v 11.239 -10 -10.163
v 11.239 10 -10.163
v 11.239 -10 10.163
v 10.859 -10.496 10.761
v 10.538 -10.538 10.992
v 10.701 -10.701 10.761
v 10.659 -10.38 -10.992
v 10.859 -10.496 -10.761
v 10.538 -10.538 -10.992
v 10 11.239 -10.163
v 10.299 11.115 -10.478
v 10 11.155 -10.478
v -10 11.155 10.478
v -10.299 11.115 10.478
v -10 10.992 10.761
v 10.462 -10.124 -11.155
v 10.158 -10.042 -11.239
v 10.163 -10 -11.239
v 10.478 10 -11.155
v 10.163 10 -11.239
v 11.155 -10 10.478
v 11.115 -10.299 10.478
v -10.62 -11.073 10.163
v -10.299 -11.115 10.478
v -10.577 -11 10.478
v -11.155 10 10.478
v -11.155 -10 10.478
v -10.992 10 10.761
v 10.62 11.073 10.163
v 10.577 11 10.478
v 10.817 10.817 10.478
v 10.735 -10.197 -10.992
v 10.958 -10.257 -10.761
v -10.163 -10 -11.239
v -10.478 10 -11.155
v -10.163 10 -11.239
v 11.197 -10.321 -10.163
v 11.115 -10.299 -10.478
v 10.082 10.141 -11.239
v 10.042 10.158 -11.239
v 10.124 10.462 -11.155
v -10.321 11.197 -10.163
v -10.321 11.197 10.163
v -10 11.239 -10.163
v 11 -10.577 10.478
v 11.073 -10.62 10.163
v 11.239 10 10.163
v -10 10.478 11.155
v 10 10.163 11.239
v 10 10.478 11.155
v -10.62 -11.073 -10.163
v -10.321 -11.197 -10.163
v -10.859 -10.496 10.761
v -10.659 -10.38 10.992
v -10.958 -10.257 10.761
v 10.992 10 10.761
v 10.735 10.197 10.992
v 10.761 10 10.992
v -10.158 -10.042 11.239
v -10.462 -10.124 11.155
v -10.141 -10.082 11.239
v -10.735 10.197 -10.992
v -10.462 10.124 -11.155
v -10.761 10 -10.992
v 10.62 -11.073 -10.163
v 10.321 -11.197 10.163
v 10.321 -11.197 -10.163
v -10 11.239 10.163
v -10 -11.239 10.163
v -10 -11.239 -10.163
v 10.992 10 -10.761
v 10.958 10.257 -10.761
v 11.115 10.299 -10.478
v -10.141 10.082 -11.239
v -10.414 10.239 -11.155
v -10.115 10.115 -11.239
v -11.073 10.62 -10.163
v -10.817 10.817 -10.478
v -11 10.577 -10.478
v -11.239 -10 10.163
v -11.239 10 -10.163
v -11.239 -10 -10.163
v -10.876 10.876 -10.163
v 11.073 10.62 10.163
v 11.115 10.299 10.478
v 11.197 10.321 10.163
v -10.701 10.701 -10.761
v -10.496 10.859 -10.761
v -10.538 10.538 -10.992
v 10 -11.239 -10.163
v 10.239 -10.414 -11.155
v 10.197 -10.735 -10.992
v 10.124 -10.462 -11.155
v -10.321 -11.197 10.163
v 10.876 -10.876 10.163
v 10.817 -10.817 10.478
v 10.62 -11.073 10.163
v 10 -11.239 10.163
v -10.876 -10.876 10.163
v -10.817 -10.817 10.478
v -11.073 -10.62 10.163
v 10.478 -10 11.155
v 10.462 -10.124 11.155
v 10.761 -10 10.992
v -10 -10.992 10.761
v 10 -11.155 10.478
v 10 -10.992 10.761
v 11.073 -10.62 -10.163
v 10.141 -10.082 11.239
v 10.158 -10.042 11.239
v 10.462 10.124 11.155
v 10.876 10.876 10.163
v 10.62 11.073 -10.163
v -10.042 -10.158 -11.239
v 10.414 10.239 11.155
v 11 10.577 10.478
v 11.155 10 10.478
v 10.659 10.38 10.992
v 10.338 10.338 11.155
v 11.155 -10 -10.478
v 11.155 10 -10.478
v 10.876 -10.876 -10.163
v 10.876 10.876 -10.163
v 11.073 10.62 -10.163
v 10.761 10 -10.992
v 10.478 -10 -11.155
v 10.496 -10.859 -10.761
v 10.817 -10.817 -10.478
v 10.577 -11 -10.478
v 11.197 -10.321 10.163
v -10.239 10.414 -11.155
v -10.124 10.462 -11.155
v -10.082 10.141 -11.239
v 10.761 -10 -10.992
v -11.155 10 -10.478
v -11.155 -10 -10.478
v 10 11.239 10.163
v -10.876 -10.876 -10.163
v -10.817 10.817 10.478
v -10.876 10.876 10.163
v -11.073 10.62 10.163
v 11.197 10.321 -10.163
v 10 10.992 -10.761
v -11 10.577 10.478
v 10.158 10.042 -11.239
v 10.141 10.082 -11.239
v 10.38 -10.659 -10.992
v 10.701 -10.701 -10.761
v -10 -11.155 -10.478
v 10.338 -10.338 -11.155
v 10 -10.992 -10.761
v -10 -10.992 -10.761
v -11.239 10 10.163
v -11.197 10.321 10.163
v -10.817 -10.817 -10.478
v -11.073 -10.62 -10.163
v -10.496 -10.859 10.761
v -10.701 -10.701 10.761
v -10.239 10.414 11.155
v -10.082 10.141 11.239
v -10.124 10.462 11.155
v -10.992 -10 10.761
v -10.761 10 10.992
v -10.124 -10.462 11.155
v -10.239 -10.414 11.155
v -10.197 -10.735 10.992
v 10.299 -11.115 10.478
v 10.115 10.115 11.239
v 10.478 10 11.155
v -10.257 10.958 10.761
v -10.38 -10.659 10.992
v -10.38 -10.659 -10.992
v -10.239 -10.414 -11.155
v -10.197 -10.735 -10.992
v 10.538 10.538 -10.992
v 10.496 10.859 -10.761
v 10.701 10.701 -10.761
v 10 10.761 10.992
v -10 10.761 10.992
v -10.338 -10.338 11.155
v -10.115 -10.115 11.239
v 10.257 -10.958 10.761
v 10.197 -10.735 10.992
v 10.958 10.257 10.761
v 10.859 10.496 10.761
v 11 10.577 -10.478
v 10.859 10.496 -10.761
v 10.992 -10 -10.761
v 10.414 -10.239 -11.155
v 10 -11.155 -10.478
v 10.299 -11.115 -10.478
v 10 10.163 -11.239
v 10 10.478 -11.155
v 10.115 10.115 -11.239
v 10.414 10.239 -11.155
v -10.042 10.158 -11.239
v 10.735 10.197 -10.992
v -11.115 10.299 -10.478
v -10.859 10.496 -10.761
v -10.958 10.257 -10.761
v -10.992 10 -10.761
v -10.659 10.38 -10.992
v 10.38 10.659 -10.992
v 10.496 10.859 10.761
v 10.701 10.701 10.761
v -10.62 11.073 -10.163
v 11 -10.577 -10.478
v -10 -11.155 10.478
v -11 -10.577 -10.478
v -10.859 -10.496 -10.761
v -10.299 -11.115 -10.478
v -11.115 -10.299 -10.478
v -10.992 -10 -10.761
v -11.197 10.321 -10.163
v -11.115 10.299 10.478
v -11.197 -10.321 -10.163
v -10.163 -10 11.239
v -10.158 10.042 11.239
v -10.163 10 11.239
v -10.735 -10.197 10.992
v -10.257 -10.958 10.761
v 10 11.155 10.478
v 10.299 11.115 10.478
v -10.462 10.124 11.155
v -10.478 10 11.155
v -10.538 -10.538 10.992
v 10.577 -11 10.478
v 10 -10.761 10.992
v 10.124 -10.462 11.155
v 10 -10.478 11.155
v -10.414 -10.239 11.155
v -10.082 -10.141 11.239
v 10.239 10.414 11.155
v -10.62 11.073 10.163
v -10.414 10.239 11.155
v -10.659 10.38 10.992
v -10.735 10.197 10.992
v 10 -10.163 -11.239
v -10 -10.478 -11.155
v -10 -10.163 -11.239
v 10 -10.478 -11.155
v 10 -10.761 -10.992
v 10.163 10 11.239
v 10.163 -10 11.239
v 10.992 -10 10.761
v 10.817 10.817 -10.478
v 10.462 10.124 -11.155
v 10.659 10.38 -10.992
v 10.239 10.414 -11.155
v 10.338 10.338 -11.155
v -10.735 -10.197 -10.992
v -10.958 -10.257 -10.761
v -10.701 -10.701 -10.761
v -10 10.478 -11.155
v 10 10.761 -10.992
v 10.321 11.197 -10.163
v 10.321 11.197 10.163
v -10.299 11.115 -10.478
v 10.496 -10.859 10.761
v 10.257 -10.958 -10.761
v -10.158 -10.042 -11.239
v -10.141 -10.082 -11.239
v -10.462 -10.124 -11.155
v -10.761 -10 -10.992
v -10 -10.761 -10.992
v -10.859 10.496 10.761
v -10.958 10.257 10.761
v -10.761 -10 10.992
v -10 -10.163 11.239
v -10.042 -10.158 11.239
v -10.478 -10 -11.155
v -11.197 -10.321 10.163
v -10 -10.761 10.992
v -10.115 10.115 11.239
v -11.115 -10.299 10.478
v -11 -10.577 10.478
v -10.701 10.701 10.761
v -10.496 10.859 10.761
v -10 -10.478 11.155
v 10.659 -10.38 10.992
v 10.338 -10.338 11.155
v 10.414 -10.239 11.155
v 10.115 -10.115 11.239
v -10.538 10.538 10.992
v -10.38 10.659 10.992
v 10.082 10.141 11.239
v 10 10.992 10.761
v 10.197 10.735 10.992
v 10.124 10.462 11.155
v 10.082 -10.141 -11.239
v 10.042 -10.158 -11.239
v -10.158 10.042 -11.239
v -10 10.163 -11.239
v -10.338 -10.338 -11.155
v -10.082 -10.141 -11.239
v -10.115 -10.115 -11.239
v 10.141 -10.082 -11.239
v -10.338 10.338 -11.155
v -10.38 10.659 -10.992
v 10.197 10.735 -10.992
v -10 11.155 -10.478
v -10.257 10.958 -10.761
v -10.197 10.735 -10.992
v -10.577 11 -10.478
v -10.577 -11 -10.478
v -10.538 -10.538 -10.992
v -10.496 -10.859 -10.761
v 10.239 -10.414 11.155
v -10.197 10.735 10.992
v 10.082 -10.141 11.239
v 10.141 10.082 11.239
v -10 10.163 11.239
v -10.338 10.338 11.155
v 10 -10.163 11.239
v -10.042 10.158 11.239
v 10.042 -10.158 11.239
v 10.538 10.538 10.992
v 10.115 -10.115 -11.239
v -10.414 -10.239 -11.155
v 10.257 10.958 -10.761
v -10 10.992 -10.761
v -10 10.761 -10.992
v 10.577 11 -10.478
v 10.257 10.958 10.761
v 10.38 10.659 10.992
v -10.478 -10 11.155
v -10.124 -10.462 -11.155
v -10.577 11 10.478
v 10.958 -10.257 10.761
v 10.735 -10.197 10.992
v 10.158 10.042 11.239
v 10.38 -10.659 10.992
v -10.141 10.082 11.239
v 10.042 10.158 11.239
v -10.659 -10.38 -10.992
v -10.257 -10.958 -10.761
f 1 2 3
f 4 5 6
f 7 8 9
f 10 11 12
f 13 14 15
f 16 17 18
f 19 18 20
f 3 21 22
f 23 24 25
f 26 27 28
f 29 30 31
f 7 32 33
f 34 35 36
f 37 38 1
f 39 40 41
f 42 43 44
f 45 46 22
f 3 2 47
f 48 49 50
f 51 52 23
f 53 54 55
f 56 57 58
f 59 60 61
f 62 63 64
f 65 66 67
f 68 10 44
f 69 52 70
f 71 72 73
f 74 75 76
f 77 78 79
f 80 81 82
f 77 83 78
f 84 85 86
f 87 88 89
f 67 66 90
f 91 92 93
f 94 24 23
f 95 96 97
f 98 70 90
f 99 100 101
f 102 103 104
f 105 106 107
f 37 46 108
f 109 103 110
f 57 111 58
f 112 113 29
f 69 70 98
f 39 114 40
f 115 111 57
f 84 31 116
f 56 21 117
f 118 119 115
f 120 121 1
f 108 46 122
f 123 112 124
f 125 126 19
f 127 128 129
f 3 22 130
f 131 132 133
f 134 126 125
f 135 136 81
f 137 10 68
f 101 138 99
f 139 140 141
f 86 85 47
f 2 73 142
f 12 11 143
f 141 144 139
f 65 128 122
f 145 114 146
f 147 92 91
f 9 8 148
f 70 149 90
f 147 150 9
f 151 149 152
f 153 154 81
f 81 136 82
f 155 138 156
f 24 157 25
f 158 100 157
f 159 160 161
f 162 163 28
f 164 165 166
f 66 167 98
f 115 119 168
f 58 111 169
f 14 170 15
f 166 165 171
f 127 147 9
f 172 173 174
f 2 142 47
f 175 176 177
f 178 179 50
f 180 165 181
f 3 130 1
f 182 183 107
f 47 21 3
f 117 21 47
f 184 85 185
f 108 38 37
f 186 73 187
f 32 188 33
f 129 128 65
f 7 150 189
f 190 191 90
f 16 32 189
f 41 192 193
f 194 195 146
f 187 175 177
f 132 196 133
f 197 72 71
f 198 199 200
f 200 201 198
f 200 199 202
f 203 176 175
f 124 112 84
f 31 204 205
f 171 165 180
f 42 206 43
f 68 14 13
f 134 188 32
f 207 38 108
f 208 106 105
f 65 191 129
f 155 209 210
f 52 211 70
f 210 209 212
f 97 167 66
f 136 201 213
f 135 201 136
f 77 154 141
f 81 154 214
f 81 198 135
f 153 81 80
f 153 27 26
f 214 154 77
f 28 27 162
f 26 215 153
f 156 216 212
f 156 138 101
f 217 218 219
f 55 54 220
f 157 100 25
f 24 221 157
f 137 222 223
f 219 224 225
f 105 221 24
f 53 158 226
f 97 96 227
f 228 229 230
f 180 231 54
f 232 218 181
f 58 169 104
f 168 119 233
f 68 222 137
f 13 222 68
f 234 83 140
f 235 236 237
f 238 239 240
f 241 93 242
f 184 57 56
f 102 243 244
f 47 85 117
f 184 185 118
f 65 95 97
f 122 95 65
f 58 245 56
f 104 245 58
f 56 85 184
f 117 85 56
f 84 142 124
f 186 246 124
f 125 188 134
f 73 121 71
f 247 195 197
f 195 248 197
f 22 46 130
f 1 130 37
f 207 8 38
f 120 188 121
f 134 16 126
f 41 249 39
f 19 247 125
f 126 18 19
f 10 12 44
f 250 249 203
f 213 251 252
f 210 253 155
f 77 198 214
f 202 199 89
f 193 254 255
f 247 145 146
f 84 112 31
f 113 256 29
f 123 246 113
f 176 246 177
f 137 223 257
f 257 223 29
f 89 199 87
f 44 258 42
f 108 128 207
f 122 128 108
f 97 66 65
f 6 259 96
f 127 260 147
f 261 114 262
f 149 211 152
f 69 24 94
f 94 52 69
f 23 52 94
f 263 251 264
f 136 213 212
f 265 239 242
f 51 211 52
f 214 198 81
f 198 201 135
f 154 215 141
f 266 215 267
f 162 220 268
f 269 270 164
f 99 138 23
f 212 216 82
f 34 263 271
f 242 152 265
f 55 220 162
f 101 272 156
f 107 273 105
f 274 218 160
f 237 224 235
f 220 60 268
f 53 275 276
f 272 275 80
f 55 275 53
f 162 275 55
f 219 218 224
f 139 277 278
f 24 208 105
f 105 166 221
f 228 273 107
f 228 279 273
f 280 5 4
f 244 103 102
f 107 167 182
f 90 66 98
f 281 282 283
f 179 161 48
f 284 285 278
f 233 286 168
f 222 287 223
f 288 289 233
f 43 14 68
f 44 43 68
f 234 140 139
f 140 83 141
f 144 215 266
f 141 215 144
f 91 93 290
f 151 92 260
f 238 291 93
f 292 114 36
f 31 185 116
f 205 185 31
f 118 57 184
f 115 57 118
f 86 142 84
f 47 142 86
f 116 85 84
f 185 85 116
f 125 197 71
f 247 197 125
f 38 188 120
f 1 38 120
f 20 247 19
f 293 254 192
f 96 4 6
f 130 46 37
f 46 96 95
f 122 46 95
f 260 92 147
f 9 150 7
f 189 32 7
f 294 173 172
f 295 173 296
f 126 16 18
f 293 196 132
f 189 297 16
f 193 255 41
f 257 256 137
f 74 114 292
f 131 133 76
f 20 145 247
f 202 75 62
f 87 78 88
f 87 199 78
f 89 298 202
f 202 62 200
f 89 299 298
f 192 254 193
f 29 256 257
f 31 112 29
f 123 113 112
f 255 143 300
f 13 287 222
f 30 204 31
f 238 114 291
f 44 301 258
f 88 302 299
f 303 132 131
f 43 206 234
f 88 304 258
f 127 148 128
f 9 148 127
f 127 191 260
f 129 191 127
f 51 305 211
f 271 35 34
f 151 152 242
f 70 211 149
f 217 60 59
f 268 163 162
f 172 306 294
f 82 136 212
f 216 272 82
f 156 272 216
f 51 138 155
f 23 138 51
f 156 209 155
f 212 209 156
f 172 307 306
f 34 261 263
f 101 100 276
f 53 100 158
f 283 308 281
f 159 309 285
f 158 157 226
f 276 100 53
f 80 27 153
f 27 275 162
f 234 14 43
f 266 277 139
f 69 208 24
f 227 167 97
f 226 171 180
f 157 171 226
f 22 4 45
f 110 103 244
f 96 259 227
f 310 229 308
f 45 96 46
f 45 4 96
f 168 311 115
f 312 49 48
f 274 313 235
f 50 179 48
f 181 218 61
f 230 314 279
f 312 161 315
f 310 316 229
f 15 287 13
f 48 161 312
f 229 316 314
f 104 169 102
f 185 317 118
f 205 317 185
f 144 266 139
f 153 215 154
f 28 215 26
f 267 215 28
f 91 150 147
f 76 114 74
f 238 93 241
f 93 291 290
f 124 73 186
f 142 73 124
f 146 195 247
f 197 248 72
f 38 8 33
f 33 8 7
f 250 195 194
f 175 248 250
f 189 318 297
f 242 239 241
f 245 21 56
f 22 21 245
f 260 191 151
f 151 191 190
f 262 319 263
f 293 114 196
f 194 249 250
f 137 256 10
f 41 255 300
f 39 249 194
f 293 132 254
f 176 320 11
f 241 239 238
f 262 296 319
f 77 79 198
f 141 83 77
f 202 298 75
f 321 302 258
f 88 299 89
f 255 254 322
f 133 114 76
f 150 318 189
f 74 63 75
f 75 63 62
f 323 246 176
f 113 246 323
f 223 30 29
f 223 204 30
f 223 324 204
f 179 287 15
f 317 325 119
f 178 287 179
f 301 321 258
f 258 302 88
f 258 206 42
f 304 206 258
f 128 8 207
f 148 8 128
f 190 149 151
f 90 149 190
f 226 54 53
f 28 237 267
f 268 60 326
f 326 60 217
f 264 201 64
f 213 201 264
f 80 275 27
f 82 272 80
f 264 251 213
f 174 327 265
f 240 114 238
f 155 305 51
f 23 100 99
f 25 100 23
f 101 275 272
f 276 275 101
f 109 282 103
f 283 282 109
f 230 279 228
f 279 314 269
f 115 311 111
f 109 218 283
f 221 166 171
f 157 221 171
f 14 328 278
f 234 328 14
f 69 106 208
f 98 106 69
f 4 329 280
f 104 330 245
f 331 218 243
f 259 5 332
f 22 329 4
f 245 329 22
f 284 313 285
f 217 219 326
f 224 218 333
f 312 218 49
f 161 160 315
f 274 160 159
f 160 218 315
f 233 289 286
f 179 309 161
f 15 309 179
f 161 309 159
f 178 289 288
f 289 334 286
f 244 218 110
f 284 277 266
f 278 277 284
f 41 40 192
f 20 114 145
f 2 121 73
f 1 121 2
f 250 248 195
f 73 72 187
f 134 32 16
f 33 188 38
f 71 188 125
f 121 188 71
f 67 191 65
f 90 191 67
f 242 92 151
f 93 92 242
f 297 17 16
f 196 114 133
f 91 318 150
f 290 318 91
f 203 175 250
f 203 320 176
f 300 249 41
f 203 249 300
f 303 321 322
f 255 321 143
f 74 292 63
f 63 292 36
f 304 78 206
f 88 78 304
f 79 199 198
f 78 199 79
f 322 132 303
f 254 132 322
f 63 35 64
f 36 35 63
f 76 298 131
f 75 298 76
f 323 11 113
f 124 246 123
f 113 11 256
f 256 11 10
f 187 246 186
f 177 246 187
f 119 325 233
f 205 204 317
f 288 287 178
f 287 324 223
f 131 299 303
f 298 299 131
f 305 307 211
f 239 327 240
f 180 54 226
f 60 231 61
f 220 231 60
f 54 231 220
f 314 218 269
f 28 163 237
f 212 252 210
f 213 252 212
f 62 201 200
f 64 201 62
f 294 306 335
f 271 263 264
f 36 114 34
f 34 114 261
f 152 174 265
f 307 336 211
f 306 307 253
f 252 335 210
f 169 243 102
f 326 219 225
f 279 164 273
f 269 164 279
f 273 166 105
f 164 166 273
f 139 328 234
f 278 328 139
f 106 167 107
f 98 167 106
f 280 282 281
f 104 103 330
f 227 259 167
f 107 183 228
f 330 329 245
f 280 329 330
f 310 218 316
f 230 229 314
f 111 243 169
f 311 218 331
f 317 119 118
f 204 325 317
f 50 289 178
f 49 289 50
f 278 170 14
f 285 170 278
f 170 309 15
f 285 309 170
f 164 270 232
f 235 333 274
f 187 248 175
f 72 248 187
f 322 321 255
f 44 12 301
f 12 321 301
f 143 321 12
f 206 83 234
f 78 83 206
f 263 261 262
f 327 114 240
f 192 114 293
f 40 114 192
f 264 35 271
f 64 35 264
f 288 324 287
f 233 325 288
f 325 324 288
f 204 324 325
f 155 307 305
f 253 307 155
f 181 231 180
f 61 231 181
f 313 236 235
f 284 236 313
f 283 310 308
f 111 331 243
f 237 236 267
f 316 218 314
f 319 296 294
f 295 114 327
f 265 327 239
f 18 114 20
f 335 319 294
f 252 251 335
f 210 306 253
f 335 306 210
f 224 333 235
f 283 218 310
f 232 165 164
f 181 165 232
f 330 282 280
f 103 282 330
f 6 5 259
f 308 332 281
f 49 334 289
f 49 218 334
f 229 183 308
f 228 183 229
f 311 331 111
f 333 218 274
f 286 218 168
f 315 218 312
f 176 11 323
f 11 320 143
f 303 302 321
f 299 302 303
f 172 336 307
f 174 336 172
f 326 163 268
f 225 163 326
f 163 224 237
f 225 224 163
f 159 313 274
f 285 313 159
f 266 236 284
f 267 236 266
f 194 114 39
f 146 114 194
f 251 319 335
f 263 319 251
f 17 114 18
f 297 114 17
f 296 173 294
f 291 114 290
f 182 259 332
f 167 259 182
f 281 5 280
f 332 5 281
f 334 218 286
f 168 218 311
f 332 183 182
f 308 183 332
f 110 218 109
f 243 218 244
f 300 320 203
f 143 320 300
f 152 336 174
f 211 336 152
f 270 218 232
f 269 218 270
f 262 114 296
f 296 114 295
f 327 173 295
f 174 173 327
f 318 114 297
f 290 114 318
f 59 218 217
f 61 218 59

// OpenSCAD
fillet = 2.5;
minkowski() {
    cube([20, 20, 20], center = true);
    sphere(d = fillet, $fn = 24);
}
